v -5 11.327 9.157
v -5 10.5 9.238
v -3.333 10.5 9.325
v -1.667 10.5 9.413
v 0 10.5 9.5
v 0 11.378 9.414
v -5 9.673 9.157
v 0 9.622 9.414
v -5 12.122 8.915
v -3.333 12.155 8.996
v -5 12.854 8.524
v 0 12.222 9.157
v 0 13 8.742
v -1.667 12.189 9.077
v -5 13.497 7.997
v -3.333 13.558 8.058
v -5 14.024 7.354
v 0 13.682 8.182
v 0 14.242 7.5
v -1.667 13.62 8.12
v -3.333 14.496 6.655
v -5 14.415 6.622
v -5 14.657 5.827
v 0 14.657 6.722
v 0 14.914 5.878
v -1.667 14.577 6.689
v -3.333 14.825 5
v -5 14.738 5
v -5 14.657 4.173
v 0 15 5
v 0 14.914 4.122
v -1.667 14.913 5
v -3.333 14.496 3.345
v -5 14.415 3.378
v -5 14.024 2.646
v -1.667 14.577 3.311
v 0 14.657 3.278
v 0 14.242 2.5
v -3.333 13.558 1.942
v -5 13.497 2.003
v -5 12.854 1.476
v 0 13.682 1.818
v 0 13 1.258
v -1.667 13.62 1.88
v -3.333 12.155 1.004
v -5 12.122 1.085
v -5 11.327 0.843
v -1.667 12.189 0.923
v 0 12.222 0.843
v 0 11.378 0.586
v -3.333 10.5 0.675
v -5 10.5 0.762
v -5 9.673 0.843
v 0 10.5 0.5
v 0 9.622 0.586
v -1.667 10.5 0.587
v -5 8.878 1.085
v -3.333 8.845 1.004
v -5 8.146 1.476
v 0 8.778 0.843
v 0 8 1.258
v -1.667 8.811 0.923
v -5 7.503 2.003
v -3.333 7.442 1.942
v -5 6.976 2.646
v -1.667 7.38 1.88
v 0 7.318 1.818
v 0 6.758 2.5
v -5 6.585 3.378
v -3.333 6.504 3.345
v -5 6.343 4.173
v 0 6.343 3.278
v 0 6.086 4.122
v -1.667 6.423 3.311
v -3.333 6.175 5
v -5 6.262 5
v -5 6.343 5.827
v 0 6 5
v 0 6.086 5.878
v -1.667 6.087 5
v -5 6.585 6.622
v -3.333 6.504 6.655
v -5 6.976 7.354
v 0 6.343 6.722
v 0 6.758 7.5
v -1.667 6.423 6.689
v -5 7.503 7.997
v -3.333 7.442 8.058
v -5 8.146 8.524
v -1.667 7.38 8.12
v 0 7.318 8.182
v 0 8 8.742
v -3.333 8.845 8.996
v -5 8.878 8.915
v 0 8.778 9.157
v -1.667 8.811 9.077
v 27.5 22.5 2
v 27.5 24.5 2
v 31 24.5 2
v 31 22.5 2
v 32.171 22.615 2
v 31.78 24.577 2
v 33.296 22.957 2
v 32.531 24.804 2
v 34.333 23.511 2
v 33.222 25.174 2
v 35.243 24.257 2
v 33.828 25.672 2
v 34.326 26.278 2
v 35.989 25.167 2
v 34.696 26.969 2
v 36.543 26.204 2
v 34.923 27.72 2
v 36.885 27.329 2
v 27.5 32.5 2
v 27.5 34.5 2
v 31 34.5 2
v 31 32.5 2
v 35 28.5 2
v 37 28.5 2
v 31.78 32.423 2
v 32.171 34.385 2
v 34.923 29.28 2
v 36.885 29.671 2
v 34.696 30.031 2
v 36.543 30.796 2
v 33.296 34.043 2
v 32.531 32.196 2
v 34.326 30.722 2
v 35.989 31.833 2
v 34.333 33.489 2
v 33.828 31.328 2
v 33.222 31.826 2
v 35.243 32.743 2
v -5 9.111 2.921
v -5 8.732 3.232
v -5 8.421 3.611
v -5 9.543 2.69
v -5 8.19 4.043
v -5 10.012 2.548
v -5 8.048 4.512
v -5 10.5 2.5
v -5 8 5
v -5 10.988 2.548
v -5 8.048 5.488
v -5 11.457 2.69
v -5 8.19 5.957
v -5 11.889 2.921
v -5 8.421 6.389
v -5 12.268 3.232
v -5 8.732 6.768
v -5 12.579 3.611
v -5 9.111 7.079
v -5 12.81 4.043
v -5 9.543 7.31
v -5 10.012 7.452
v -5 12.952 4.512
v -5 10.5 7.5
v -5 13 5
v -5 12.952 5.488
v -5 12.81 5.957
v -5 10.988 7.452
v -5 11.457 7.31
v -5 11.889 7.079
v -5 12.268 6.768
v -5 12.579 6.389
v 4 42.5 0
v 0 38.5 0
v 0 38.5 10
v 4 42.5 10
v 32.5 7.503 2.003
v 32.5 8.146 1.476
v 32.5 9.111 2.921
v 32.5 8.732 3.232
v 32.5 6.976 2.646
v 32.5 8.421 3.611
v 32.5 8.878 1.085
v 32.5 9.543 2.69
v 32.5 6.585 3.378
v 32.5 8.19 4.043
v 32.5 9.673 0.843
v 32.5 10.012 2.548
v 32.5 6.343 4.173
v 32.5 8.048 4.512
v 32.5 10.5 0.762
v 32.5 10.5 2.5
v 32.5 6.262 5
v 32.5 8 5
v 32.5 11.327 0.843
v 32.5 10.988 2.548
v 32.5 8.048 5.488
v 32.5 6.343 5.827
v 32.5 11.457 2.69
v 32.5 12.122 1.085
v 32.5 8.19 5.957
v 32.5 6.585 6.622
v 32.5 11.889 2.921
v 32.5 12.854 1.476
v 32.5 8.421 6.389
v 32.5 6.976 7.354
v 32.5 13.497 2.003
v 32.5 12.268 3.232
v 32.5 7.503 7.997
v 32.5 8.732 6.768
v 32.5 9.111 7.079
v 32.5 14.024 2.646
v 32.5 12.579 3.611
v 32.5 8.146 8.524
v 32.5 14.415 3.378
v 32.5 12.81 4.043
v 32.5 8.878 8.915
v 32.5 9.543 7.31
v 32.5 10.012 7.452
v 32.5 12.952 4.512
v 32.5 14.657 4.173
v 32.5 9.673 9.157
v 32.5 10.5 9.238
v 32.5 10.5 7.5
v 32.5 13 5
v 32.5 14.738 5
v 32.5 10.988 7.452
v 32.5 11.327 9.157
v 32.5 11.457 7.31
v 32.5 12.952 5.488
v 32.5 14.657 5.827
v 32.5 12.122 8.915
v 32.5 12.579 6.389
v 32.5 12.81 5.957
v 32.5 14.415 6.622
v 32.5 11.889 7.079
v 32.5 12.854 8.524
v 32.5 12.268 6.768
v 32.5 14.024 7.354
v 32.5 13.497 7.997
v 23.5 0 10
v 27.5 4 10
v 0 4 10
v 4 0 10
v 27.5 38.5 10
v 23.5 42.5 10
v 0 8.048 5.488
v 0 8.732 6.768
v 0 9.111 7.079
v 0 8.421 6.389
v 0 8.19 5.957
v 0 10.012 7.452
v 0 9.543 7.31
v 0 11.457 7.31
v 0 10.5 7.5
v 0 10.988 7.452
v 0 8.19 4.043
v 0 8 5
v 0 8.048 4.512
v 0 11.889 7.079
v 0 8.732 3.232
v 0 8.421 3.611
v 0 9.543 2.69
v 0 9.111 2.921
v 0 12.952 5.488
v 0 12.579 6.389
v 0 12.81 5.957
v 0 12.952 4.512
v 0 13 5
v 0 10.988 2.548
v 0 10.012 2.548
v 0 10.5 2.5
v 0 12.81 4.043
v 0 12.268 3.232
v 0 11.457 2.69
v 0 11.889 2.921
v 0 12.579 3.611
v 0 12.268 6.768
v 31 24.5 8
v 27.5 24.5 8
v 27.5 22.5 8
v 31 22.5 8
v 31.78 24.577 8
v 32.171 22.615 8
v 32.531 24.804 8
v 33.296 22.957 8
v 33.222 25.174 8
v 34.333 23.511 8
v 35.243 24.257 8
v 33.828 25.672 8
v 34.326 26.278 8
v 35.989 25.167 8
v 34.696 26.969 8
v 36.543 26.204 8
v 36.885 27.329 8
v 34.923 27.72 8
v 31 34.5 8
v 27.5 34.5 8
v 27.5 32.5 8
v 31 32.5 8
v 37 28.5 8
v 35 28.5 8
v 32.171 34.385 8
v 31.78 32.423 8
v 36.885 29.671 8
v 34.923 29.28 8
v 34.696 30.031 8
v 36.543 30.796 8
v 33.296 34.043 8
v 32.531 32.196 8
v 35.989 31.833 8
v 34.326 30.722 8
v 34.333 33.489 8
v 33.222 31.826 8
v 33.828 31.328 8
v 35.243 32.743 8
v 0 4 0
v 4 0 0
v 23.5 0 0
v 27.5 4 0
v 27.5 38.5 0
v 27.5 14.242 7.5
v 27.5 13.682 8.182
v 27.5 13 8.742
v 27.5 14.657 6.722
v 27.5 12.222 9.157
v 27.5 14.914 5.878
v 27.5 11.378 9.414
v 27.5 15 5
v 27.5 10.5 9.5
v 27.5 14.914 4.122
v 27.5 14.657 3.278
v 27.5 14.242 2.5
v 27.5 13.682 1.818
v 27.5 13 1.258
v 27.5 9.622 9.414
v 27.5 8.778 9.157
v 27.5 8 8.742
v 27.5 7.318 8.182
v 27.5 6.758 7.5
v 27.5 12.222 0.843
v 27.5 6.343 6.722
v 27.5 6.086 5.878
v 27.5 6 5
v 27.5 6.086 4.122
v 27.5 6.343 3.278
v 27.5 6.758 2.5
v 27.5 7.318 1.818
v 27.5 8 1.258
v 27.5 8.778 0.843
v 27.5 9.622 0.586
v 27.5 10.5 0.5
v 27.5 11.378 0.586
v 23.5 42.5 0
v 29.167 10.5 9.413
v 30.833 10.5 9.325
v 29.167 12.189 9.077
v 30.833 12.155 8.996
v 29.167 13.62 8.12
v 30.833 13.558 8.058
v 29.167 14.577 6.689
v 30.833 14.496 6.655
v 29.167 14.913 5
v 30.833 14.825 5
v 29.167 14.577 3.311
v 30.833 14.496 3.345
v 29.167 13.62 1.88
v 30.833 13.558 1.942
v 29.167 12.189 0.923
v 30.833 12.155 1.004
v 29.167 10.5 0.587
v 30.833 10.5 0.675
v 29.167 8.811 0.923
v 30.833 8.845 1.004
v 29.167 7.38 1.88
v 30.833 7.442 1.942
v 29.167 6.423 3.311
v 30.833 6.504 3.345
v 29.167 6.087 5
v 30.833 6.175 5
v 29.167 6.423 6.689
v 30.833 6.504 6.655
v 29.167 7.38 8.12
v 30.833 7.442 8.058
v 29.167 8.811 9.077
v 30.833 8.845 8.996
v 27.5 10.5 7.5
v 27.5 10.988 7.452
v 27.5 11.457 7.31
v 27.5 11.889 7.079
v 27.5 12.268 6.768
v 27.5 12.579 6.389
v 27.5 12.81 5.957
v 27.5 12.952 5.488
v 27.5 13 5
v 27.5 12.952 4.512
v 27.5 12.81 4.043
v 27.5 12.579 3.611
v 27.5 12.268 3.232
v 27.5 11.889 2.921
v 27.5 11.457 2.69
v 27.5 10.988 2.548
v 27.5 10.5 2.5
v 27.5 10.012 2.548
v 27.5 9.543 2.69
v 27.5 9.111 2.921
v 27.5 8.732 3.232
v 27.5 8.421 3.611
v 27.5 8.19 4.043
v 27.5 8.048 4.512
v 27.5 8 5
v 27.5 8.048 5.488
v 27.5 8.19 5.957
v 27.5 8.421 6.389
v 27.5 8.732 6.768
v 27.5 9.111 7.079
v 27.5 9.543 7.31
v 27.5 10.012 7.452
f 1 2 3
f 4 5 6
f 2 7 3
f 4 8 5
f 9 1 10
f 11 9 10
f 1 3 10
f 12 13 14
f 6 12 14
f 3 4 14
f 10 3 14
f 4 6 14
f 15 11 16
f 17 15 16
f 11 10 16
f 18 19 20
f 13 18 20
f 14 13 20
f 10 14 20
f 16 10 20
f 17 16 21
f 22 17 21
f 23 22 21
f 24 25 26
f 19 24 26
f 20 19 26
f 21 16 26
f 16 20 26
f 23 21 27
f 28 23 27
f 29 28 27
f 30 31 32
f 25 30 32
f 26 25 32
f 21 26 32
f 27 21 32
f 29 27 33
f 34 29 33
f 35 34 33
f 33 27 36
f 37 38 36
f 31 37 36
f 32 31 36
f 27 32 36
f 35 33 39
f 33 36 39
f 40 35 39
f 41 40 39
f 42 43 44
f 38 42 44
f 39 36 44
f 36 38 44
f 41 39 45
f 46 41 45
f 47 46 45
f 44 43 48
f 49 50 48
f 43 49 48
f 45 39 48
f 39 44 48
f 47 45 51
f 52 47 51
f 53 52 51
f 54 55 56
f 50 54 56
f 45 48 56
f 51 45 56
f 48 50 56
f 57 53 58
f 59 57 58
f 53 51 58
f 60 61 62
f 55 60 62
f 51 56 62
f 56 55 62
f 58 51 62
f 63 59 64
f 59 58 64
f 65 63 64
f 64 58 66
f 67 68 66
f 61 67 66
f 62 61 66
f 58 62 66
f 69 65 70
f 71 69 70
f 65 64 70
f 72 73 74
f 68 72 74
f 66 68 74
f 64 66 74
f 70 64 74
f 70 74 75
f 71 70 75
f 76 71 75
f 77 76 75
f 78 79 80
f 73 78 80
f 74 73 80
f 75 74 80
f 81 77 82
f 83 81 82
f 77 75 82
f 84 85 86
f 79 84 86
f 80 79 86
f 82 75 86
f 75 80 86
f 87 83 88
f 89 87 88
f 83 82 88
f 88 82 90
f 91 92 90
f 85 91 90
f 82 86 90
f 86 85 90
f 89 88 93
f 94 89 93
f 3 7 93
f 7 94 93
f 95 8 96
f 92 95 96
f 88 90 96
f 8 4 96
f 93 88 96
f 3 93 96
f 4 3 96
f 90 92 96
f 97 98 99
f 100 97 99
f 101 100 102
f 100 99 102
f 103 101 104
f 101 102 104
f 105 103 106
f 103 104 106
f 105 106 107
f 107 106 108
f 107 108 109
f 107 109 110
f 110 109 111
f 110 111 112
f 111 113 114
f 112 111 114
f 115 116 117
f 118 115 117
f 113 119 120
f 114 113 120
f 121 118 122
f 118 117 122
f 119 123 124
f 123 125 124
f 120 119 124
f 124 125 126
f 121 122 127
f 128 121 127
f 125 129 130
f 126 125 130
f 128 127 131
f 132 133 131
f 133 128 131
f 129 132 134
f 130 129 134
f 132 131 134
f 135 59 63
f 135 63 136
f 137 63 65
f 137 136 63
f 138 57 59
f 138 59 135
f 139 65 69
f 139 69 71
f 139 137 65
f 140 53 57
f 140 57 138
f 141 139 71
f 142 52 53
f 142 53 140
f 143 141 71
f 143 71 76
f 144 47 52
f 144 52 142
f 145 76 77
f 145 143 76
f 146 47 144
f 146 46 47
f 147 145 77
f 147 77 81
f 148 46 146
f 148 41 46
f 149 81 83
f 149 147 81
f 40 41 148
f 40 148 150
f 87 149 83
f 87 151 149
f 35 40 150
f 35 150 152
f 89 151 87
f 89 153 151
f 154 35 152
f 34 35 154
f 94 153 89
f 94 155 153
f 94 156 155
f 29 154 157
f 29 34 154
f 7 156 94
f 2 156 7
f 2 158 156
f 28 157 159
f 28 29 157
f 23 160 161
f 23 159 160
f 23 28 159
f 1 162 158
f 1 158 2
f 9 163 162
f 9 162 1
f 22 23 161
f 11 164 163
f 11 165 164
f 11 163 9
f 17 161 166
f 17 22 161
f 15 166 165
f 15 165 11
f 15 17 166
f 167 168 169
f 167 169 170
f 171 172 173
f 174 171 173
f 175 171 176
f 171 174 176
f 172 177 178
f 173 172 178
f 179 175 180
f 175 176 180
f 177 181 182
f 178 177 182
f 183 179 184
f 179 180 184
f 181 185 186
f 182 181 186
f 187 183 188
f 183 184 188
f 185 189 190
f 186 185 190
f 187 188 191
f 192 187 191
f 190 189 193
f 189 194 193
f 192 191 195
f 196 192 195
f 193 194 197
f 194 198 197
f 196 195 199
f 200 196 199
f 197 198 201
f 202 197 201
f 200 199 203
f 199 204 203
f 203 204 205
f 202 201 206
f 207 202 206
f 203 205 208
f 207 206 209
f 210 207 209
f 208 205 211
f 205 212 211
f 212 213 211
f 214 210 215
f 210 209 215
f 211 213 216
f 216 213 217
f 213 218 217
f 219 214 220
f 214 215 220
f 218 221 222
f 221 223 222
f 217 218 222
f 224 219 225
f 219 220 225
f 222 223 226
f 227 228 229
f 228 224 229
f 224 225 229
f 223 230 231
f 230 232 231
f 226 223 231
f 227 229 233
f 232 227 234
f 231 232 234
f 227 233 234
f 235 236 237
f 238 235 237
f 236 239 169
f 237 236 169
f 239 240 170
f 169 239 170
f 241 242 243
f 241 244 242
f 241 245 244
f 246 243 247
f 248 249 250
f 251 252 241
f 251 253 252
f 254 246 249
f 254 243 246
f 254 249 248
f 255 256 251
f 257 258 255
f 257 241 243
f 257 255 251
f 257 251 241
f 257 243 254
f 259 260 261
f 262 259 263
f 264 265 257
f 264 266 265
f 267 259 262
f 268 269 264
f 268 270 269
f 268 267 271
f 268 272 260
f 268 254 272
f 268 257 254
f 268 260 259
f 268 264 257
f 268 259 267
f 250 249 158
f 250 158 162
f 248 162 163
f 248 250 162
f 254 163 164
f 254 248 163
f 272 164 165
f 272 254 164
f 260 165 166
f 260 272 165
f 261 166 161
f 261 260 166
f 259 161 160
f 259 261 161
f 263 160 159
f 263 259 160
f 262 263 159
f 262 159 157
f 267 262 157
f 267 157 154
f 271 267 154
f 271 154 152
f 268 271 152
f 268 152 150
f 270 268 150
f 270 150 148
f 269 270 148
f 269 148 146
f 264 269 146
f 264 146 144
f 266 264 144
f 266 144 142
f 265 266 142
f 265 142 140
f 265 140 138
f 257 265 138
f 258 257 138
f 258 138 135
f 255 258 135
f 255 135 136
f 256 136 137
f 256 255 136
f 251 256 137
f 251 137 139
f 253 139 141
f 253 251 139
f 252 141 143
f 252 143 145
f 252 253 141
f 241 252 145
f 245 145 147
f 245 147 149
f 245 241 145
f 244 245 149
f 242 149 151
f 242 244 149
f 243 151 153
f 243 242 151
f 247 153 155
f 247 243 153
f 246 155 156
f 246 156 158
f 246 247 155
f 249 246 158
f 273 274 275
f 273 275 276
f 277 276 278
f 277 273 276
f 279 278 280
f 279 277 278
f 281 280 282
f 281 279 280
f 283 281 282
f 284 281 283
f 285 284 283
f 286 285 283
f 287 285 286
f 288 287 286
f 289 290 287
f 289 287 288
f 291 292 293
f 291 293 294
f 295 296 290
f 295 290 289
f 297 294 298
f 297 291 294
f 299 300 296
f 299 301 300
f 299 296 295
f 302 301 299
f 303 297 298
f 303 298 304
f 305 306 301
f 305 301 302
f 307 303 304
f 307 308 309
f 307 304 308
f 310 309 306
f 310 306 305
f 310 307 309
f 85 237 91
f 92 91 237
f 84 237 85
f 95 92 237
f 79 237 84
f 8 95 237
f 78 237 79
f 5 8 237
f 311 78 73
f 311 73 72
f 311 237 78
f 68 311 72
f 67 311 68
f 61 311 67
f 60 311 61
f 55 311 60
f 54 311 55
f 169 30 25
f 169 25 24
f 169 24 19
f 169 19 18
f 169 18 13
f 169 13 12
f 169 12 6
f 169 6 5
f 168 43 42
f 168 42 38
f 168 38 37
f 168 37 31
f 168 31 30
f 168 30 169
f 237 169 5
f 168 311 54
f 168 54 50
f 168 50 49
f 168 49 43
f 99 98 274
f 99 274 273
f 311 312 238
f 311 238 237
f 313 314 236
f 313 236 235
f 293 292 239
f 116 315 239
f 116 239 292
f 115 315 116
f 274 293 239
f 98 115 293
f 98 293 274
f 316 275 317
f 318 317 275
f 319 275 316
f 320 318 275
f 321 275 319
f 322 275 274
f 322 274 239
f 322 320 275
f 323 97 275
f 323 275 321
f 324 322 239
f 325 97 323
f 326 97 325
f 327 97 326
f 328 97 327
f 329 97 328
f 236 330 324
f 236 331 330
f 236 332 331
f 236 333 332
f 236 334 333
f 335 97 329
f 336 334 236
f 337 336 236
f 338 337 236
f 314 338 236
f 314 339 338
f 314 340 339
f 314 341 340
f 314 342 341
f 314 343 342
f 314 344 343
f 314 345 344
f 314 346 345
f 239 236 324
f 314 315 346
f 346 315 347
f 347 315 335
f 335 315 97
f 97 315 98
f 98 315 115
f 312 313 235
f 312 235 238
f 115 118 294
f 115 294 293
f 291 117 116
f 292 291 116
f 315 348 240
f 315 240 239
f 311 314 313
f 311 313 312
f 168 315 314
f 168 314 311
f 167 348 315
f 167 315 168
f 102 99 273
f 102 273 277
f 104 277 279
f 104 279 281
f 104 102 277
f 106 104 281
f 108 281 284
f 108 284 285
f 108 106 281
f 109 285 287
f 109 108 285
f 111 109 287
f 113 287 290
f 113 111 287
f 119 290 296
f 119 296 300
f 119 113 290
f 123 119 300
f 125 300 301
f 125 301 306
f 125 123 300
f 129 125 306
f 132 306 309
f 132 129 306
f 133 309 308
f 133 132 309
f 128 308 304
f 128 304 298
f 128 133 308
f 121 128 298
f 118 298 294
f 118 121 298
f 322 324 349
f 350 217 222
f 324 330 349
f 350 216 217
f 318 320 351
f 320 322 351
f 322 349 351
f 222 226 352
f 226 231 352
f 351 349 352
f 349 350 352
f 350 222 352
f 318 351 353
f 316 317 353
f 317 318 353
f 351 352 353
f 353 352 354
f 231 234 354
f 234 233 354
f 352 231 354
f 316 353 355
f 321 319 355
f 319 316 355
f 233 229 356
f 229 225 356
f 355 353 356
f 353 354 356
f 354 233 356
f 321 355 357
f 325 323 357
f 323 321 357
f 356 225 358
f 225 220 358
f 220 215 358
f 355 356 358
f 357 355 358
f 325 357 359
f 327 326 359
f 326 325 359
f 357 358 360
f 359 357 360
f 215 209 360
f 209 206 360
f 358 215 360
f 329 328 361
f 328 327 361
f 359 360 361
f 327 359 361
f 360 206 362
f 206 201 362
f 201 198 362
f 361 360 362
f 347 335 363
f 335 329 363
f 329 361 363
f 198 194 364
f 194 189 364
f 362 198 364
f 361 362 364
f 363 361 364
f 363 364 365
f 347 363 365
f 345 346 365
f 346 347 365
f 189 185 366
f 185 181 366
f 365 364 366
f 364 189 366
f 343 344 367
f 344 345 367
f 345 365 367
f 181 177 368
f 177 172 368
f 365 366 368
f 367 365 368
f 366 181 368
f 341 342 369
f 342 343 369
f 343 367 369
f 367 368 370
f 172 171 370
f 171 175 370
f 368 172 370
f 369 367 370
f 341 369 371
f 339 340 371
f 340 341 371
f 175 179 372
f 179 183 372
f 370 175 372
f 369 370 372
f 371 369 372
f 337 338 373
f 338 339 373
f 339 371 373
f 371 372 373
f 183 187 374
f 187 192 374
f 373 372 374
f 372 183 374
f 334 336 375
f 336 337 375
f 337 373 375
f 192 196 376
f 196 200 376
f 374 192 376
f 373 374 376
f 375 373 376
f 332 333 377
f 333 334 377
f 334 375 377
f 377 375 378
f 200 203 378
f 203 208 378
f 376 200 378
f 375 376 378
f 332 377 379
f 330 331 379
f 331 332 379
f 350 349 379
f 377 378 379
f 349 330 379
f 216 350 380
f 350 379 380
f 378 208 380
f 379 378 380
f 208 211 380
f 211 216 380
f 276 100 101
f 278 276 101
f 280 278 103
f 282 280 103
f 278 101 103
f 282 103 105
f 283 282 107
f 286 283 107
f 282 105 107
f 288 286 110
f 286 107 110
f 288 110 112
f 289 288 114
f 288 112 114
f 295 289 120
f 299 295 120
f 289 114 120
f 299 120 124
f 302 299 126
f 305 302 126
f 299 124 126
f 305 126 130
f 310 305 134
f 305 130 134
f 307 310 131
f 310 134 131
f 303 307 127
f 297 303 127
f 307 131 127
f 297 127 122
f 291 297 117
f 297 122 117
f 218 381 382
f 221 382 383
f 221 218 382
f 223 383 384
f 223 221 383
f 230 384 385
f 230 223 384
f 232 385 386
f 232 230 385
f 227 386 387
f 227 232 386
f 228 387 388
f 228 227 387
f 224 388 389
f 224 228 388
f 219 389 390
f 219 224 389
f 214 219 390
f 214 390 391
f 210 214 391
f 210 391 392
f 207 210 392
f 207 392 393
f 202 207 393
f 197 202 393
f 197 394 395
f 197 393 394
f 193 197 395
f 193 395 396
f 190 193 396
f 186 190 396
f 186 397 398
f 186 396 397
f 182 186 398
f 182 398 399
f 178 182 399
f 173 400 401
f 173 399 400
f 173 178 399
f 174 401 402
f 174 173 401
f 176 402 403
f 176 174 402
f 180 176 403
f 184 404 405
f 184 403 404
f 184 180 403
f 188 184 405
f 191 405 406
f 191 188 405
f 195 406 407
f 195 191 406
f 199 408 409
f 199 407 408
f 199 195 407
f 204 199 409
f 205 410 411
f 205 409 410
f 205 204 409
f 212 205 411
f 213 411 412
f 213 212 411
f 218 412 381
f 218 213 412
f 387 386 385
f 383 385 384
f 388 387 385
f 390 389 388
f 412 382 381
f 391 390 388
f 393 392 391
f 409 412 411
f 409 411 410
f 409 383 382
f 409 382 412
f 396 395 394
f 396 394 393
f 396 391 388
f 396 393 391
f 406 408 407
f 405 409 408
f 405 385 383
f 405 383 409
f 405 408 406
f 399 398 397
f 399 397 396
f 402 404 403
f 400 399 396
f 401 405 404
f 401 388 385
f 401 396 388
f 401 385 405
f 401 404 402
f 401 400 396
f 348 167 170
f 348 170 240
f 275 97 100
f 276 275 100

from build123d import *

# Parameters (mm, degrees)
EXTRUDE_1_DEPTH      = 10
EXTRUDE_2_DEPTH      = 5
EXTRUDE_2_DEPTH_BACK = 32.5
SKETCH_2_R           = 4.5
SKETCH_2_R_2         = 2.5
DRAFT_1_ANGLE        = 3
DRAFT_2_ANGLE        = 3
EXTRUDE_3_DEPTH      = 3
EXTRUDE_3_DEPTH_BACK = 3


with BuildPart() as part:
    # 草图1 → 凸台-拉伸1 (new body)
    with BuildSketch(Plane.XY):
        Polygon((0, 38.5), (4, 42.5), (23.5, 42.5), (27.5, 38.5), (27.5, 4), (23.5, 0), (4, 0), (0, 4), align=None)
    extrude(amount=EXTRUDE_1_DEPTH)

    # 草图2 → 凸台-拉伸2 (add, two sides: drawn at the far end of the back side and taken through both)
    with BuildSketch(Plane.ZY.offset(-EXTRUDE_2_DEPTH_BACK)):
        with Locations((5, 10.5)):
            Circle(SKETCH_2_R)
        with Locations((5, 10.5)):
            Circle(SKETCH_2_R_2, mode=Mode.SUBTRACT)
    extrude(amount=EXTRUDE_2_DEPTH + EXTRUDE_2_DEPTH_BACK)

    # 拔模1
    draft_1_faces = [part.faces().sort_by_distance(p)[0] for p in [
        (30, 10.5, 0.5),
    ]]
    draft(draft_1_faces, Plane(origin=(27.5, 4, 10), x_dir=(0, 0, 1), z_dir=(1, 0, 0)), DRAFT_1_ANGLE)

    # 拔模2
    draft_2_faces = [part.faces().sort_by_distance(p)[0] for p in [
        (-2.5, 10.5, 0.5),
    ]]
    draft(draft_2_faces, Plane(origin=(0, 4, 10), x_dir=(0, 0, -1), z_dir=(-1, 0, 0)), DRAFT_2_ANGLE)

    # 草图3 → 凸台-拉伸3 (add, two sides: drawn at the far end of the back side and taken through both)
    with BuildSketch(Plane.XY.offset(5).offset(-EXTRUDE_3_DEPTH_BACK)):
        with BuildLine():
            Line((31, 34.5), (25.5, 34.5))
            Line((25.5, 34.5), (25.5, 22.5))
            Line((25.5, 22.5), (31, 22.5))
            ThreePointArc((31, 22.5), (37, 28.5), (31, 34.5))
        make_face()
        with BuildLine():
            Line((31, 32.5), (27.5, 32.5))
            Line((27.5, 32.5), (27.5, 24.5))
            Line((27.5, 24.5), (31, 24.5))
            ThreePointArc((31, 24.5), (35, 28.5), (31, 32.5))
        make_face(mode=Mode.SUBTRACT)
    extrude(amount=EXTRUDE_3_DEPTH + EXTRUDE_3_DEPTH_BACK)


solid = part.part
